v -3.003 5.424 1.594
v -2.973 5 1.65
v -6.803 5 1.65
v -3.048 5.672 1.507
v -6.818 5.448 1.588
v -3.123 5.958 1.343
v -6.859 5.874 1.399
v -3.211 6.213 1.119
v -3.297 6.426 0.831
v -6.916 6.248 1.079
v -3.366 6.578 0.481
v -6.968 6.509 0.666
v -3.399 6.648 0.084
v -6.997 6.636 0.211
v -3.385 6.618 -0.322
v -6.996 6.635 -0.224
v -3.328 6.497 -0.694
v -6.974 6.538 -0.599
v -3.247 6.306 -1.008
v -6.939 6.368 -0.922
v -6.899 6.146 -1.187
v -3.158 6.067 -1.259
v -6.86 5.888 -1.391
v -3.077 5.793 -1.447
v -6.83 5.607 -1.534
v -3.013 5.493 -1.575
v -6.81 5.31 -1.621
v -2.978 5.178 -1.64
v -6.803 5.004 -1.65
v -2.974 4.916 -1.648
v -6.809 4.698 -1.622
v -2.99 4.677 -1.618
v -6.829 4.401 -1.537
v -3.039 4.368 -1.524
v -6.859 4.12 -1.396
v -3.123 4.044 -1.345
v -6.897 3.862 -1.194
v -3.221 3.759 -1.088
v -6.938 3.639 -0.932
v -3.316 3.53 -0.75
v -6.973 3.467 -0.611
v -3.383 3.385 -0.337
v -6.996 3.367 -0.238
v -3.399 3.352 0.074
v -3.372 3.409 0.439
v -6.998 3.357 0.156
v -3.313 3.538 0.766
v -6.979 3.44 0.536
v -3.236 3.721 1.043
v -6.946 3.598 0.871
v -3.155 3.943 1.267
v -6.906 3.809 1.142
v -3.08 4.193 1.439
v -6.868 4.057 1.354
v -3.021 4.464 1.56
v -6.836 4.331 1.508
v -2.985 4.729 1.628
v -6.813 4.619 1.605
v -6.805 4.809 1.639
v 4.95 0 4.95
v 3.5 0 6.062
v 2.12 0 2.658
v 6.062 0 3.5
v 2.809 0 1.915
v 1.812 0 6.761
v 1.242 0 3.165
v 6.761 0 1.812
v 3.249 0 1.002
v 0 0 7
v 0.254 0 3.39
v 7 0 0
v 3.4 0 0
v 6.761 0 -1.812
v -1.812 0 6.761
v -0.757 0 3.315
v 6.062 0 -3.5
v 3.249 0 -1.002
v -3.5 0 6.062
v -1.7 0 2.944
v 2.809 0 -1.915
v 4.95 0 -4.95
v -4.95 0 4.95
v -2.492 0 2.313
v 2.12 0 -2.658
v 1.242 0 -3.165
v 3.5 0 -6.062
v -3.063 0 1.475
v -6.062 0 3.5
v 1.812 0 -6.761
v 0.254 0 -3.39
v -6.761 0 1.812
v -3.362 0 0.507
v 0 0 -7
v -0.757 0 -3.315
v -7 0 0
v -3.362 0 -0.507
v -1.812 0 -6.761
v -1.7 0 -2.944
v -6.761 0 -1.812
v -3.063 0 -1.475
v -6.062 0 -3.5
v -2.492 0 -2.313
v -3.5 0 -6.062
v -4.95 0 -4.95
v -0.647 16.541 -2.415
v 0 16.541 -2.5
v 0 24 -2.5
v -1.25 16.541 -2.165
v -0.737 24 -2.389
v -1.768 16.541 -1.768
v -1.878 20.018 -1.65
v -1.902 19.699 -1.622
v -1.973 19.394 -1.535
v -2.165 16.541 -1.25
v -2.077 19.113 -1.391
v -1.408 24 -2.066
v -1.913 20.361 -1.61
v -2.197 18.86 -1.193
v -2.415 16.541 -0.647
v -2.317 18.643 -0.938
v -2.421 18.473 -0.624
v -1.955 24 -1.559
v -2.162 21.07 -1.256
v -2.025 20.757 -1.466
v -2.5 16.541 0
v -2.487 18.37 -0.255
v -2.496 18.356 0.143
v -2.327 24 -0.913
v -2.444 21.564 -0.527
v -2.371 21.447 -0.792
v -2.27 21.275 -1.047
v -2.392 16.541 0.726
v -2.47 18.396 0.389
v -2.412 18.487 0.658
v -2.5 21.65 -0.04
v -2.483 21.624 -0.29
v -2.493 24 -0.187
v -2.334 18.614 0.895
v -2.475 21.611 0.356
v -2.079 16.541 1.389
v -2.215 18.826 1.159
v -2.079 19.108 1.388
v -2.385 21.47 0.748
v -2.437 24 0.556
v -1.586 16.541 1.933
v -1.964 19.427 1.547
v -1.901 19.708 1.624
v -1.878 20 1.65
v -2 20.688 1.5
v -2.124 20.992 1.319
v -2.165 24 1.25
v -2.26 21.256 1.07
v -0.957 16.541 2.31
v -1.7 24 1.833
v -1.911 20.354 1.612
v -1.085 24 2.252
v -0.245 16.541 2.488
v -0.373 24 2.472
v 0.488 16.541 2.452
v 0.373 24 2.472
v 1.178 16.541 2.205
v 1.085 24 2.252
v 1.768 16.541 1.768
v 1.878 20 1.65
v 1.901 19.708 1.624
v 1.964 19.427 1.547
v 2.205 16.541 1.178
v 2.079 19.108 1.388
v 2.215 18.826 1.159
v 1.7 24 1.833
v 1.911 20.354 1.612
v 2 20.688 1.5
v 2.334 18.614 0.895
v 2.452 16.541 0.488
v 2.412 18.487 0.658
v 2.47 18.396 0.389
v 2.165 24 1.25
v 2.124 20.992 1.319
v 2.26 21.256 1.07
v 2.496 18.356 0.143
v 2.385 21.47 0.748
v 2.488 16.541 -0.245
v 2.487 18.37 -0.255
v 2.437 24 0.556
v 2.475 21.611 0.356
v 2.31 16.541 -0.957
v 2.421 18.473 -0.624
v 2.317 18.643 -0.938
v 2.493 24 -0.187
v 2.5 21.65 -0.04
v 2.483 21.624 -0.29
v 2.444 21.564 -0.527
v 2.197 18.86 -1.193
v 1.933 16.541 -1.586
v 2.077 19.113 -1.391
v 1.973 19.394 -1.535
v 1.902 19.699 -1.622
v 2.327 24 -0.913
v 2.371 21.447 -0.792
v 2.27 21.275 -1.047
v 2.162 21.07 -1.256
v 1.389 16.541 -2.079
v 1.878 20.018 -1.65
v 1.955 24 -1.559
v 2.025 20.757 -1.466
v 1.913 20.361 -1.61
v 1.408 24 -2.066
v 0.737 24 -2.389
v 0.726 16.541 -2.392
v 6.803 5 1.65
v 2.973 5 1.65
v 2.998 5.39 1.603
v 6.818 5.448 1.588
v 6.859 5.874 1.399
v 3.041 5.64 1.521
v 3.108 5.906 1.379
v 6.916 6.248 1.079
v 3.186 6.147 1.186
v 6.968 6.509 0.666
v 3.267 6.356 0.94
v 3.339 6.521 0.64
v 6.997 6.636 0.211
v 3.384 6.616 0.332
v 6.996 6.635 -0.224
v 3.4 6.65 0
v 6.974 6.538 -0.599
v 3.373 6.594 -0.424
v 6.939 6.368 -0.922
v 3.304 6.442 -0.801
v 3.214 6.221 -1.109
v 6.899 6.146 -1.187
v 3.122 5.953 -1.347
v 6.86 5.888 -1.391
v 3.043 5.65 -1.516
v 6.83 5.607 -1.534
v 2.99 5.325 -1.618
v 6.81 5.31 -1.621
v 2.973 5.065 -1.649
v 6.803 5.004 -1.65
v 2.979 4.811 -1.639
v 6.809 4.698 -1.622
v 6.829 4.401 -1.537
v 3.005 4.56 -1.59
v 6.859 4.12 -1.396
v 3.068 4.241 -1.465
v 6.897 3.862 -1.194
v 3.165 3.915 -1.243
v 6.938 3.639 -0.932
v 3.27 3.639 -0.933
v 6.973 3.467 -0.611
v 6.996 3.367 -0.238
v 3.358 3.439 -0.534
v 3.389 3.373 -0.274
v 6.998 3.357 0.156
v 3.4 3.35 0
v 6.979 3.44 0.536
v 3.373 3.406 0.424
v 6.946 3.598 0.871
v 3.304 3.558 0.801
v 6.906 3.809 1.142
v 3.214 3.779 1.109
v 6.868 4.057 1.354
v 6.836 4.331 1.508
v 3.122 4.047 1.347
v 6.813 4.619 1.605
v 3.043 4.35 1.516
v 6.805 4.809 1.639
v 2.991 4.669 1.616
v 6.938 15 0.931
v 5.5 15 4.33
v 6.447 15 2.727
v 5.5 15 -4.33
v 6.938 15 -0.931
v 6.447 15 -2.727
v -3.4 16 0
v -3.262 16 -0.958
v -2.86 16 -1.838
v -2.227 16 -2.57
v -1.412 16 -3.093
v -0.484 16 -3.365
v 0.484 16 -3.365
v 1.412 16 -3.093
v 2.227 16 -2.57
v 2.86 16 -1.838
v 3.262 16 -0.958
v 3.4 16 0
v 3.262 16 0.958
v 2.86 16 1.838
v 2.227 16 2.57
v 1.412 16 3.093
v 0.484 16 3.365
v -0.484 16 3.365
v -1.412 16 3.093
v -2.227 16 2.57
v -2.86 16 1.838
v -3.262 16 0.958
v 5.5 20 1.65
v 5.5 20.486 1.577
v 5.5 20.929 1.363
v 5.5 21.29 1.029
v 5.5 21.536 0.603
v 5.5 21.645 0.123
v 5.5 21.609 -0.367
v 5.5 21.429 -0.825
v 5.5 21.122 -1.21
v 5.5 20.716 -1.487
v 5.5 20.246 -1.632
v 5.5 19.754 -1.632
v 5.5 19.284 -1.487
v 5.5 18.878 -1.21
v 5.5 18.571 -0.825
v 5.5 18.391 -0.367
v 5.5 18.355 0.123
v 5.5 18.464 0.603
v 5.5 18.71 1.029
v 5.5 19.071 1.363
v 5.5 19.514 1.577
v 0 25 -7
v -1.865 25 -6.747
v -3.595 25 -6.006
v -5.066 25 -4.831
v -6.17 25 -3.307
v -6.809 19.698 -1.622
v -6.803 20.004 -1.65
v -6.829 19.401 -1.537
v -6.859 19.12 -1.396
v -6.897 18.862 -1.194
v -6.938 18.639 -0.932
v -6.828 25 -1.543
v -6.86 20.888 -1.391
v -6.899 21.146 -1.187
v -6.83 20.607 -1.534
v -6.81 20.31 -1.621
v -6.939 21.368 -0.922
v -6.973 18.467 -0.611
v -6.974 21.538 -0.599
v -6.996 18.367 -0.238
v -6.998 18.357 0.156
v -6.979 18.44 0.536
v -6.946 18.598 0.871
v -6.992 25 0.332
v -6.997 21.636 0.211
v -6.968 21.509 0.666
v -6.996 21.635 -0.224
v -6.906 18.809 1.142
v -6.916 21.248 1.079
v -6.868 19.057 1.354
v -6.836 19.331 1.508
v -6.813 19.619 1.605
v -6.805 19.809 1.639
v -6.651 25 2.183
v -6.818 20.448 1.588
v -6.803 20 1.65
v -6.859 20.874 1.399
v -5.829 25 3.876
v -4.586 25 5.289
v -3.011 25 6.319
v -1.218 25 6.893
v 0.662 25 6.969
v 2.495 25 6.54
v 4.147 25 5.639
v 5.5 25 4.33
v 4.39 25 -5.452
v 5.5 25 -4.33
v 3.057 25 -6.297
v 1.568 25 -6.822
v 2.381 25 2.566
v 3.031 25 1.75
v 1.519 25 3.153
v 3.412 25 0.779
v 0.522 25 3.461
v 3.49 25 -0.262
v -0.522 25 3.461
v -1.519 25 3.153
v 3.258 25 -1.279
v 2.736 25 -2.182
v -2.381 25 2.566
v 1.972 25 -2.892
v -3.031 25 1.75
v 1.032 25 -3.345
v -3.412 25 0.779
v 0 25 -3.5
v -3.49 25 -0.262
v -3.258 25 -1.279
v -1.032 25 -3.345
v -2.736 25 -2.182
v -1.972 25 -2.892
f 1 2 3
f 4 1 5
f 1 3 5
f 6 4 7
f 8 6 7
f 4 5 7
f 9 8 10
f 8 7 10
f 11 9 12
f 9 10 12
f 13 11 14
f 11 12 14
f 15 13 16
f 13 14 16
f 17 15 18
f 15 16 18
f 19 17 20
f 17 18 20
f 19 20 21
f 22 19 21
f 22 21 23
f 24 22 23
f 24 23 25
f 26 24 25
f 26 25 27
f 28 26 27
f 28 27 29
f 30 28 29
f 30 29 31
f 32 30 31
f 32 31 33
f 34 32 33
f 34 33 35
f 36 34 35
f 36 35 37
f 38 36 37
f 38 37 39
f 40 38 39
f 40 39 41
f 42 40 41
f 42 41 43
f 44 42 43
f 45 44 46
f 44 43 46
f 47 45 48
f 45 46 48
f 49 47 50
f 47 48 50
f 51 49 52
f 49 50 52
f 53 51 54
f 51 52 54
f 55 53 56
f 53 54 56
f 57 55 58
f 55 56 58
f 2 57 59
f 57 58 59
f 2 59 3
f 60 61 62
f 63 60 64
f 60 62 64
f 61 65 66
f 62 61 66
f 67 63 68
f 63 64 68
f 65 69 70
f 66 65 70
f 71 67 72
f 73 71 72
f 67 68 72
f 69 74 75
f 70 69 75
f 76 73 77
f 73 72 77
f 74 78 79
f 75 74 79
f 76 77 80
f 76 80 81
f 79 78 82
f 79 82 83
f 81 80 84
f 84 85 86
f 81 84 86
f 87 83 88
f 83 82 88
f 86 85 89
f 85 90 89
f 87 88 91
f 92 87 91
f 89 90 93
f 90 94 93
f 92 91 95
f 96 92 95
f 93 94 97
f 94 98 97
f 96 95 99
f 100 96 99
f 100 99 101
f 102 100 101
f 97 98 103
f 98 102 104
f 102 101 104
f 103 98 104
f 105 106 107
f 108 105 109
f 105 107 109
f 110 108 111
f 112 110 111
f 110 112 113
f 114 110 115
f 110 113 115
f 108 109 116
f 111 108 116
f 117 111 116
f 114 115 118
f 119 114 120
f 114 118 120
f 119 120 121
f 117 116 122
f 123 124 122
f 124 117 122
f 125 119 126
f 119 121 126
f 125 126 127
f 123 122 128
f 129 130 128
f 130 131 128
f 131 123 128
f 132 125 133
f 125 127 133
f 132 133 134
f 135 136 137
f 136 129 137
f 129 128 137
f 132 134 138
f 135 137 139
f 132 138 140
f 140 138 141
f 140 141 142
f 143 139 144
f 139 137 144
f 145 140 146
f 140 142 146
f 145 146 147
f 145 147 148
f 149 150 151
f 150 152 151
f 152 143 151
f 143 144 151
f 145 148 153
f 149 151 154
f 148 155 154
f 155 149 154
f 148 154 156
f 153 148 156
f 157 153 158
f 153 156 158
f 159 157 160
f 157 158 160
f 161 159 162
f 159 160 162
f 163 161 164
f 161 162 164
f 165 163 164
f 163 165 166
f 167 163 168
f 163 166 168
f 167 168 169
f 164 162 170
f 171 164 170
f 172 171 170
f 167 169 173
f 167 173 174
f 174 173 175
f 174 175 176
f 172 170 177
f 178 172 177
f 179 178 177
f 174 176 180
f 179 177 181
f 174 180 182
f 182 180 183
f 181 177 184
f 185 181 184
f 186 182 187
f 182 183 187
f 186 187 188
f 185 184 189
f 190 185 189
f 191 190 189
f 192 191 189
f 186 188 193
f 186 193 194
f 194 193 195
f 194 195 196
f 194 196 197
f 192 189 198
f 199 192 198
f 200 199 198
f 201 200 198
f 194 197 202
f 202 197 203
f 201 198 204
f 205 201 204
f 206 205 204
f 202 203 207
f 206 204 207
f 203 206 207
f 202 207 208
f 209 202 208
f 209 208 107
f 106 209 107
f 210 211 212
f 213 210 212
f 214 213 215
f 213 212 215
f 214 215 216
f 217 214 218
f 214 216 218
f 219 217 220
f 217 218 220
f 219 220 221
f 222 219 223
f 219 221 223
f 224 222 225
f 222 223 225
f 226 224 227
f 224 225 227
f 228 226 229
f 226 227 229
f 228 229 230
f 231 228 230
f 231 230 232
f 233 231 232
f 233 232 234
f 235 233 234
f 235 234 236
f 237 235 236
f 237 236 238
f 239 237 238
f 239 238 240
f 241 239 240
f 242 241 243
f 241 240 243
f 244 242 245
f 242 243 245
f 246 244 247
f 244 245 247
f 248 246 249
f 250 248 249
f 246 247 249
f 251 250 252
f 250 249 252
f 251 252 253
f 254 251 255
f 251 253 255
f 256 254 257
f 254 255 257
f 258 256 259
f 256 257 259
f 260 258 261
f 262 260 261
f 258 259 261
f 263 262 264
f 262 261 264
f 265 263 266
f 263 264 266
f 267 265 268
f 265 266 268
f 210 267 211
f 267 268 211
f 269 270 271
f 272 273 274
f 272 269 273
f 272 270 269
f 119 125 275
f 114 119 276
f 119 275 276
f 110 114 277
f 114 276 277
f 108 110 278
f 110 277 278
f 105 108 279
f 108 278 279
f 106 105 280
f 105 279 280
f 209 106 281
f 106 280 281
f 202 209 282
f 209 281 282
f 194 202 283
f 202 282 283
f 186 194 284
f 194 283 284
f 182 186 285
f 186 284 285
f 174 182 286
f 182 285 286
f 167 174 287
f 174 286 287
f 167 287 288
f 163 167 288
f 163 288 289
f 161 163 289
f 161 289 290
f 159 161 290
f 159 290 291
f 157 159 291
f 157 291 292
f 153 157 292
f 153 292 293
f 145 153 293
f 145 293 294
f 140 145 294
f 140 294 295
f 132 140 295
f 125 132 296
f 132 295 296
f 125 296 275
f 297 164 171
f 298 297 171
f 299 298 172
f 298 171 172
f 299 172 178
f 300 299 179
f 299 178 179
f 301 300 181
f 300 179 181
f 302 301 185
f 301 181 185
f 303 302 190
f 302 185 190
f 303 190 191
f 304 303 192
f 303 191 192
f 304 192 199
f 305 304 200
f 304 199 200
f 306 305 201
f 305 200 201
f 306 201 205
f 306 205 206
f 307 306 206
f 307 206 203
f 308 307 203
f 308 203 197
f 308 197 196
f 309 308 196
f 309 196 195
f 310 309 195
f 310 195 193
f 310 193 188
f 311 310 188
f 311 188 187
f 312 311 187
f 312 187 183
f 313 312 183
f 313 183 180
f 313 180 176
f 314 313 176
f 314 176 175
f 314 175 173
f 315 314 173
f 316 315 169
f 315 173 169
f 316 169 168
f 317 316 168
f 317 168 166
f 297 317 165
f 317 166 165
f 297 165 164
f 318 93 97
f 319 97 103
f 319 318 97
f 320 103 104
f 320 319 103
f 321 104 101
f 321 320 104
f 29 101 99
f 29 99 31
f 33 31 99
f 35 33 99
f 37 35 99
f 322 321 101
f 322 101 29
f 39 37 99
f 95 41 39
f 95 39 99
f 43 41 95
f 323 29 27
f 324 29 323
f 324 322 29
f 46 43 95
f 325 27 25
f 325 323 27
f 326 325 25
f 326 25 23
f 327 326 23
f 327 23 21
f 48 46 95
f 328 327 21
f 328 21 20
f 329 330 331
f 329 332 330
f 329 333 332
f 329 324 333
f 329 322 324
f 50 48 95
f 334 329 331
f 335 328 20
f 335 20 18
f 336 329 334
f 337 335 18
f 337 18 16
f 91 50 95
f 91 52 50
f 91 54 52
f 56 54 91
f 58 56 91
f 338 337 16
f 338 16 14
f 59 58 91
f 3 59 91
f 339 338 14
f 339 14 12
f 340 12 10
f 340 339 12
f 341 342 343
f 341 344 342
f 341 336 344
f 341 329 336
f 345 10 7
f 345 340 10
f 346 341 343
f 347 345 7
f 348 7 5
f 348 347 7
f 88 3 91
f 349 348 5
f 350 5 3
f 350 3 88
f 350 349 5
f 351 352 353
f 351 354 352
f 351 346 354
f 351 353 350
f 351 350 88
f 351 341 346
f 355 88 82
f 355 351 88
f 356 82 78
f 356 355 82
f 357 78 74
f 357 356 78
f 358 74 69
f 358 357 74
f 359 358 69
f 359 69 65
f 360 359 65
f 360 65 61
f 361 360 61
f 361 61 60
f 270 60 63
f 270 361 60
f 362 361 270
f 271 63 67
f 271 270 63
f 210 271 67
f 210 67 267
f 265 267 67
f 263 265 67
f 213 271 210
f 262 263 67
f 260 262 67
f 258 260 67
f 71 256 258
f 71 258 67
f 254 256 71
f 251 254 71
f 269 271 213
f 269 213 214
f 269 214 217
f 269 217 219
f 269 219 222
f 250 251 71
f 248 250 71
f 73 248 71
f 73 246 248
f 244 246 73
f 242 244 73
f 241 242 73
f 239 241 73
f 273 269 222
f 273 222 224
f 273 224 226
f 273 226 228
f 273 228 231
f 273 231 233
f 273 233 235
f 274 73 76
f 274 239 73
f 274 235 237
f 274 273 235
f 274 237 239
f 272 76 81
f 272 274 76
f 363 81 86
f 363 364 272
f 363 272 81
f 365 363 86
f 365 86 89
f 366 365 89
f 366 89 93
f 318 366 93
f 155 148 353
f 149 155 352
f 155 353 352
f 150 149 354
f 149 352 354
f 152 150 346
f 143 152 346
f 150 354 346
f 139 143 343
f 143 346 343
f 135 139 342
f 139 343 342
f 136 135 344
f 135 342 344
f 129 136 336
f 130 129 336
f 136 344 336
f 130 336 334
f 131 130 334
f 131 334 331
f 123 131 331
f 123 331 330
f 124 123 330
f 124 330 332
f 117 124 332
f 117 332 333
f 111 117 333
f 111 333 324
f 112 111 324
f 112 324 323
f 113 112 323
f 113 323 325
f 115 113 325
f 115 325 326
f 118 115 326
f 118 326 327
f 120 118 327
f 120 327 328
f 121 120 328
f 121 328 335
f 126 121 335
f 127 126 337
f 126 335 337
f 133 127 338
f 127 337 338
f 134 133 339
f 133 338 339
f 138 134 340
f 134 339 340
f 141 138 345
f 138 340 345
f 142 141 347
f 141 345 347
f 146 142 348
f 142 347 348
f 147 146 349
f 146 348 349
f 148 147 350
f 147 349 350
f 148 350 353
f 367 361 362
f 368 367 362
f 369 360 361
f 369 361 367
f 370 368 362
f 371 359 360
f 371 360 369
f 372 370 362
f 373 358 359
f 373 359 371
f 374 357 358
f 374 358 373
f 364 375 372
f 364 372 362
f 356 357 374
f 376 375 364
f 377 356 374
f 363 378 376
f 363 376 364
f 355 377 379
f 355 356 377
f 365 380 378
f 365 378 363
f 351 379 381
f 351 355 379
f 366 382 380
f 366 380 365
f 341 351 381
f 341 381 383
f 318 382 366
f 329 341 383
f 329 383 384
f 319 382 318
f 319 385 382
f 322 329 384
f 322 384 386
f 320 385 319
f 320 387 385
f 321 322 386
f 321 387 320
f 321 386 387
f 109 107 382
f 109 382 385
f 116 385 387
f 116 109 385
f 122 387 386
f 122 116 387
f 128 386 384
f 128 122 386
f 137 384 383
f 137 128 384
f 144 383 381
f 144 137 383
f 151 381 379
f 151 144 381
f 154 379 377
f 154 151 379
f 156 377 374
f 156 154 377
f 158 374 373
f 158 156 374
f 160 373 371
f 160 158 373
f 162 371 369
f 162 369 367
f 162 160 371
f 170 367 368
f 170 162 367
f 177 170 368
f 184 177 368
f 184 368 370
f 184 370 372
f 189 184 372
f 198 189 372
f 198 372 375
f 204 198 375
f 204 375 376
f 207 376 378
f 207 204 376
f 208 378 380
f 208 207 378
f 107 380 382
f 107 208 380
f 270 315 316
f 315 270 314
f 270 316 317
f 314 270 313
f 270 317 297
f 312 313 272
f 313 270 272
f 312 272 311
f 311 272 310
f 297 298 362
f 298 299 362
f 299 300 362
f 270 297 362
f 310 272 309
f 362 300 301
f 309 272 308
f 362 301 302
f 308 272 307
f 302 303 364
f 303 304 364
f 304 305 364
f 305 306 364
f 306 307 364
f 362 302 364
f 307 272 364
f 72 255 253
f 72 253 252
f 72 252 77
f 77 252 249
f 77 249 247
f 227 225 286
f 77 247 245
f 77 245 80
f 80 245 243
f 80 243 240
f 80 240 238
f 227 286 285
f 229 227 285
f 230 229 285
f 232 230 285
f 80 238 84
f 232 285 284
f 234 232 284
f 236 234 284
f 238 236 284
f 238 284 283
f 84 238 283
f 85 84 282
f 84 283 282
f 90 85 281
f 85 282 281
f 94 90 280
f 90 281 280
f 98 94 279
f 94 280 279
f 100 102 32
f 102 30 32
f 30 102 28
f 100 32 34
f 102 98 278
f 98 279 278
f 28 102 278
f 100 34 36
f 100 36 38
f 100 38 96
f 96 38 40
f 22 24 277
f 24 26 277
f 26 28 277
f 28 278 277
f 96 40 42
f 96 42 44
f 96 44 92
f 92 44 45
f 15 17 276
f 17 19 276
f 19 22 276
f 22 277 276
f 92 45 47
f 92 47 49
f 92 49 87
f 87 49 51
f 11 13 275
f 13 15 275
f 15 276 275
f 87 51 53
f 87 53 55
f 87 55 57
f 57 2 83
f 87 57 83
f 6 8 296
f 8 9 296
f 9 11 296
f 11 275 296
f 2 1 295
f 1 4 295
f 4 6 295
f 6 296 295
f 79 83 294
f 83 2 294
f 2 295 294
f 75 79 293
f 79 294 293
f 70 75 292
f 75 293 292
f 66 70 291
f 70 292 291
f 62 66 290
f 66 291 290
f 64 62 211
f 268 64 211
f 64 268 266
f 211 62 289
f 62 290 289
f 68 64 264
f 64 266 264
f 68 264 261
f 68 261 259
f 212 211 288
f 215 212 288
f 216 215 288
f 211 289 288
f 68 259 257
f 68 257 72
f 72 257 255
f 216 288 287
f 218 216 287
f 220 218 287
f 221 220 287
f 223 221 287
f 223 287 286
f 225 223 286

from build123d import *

# Parameters (mm, degrees)
SKETCH1_W               = 4.5
SKETCH1_H               = 25
CUT_EXTRUDE1_DEPTH      = 27.888659319
CUT_EXTRUDE1_DEPTH_BACK = 27.888659319
SKETCH2_W               = 1.5
SKETCH2_H               = 10
CHAMFER1_SIZE           = 1
M8_TAPPED_HOLE1_D       = 6.8
M8_TAPPED_HOLE1_DEPTH   = 16
M8_TAPPED_HOLE1_TIP     = 2.042926105
M4_TAPPED_HOLE1_D       = 3.3


with BuildPart() as part:
    # Sketch1 → Revolve1 (revolve)
    with BuildSketch(Plane.XY, mode=Mode.PRIVATE) as revolve1_sk:
        with Locations((-4.75, 12.5)):
            Rectangle(SKETCH1_W, SKETCH1_H)
    revolve(revolve1_sk.sketch.rotate(Axis((0, 0, 0), (0, 1, 0)), 270), axis=Axis((0, 0, 0), (0, 1, 0)))

    # Sketch2 → Cut-Extrude1 (cut, two sides: drawn at the far end of the back side and taken through both)
    with BuildSketch(Plane.XY.offset(-CUT_EXTRUDE1_DEPTH_BACK)):
        with Locations((6.25, 20)):
            Rectangle(SKETCH2_W, SKETCH2_H)
    extrude(amount=CUT_EXTRUDE1_DEPTH + CUT_EXTRUDE1_DEPTH_BACK, mode=Mode.SUBTRACT)

    # Chamfer1
    chamfer1_edges = [part.edges().sort_by_distance(p)[0] for p in [
        (0, 25, 2.5),
    ]]
    chamfer(chamfer1_edges, length=CHAMFER1_SIZE)

    # M8 Tapped Hole1
    with Locations(Plane(origin=(0, 0, 0), x_dir=(-1, 0, 0), z_dir=(0, -1, 0))):
        with Locations((0, 0)):
            Hole(M8_TAPPED_HOLE1_D / 2, depth=M8_TAPPED_HOLE1_DEPTH)
            with Locations((0, 0, -(M8_TAPPED_HOLE1_DEPTH + M8_TAPPED_HOLE1_TIP / 2))):  # 118° drill point
                Cone(0, M8_TAPPED_HOLE1_D / 2, M8_TAPPED_HOLE1_TIP, mode=Mode.SUBTRACT)

    # M4 Tapped Hole1 (through all)
    with Locations(Plane(origin=(7, 0, 0), x_dir=(0, 0, -1), z_dir=(1, 0, 0))):
        with Locations((0, 20), (0, 5)):
            Hole(M4_TAPPED_HOLE1_D / 2)


solid = part.part
